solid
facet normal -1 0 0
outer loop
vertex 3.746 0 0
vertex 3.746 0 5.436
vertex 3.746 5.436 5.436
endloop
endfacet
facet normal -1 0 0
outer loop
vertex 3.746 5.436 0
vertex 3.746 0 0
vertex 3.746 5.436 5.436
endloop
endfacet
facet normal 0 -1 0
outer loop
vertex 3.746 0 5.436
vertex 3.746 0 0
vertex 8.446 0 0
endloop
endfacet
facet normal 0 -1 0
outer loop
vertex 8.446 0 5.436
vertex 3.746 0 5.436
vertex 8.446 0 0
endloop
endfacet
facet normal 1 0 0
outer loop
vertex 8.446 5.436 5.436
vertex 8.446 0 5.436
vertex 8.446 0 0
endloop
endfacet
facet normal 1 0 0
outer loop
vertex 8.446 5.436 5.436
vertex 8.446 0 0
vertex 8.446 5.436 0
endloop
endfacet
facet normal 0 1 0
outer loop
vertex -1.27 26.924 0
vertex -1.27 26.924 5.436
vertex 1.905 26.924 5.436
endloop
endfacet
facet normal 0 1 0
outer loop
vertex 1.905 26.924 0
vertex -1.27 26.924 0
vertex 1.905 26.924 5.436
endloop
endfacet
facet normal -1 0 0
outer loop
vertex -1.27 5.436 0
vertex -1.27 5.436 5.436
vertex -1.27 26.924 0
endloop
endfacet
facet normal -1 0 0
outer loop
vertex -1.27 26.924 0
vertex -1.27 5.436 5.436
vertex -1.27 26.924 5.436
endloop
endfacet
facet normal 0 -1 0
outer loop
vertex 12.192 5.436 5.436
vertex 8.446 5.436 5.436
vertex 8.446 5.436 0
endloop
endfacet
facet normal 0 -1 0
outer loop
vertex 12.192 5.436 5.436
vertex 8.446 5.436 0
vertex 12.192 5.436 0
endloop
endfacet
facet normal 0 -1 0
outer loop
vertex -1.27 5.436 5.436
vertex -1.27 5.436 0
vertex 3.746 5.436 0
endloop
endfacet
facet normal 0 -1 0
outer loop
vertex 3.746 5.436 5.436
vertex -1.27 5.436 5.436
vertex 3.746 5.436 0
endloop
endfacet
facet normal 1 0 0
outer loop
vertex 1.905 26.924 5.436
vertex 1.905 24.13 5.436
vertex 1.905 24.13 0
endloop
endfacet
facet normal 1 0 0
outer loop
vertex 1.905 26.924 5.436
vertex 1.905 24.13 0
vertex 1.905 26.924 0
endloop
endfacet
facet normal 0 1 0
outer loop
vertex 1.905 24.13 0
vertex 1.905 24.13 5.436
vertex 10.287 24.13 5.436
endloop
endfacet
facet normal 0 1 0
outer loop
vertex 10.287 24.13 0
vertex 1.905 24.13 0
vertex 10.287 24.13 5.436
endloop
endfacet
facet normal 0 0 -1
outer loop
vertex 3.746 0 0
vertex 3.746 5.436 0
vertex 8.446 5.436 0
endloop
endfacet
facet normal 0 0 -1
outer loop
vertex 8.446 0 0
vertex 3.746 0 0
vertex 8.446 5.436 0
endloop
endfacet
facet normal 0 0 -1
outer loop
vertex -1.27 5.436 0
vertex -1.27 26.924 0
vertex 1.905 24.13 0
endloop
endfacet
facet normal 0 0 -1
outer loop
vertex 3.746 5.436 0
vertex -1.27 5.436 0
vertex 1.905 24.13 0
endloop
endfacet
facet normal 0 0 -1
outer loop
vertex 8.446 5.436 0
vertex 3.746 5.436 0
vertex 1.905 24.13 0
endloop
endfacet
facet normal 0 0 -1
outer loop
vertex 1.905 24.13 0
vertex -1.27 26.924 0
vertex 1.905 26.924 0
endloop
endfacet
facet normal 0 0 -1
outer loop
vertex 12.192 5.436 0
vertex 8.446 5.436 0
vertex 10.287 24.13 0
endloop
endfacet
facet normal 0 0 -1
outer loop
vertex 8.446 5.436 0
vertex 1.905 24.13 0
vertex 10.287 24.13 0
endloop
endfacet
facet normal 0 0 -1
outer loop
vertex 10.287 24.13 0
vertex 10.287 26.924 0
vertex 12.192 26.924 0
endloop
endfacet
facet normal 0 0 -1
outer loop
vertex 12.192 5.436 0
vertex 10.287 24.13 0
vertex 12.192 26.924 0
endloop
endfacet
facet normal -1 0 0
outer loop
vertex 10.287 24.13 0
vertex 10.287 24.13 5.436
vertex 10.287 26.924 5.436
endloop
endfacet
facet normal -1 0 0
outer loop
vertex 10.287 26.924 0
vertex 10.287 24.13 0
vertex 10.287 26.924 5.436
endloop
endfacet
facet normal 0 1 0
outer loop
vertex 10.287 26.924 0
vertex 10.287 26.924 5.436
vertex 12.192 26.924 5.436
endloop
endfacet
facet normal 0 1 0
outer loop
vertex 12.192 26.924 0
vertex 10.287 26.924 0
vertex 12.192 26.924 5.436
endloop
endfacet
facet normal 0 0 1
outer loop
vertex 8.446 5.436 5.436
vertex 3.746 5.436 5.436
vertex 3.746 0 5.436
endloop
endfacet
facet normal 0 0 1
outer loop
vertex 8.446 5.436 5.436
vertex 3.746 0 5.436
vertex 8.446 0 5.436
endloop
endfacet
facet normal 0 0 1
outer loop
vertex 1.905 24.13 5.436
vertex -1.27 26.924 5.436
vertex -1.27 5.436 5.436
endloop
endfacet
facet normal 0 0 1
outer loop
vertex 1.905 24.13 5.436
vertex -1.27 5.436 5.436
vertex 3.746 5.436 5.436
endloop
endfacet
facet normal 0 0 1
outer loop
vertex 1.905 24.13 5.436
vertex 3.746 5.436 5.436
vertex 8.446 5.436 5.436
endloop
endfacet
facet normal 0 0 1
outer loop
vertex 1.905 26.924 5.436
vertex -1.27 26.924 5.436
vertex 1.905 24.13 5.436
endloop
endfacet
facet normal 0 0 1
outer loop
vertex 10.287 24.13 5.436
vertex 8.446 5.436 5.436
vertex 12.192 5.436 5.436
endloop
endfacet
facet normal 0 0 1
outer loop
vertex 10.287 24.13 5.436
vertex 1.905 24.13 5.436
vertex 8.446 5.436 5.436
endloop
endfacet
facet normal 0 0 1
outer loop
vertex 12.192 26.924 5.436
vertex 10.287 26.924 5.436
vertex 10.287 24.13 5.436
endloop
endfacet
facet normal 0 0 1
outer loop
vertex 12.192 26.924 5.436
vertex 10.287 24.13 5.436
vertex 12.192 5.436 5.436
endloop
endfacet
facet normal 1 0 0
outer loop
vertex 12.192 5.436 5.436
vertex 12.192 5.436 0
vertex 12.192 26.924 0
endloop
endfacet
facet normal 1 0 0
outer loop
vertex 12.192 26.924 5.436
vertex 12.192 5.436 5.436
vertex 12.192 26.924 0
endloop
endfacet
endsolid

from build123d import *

# Parameters (mm, degrees)
SKETCH1_W           = 12.192
SKETCH1_H           = 24.384
BOSS_EXTRUDE1_DEPTH = 5.4356
SKETCH2_W           = 3.7465
SKETCH2_H           = 5.4356
CUT_EXTRUDE1_DEPTH  = 5.4356
SKETCH3_W           = 1.905
SKETCH3_H           = 2.794
BOSS_EXTRUDE2_DEPTH = 5.4356
SKETCH4_W           = 1.27
SKETCH4_H           = 21.7424
BOSS_EXTRUDE3_DEPTH = 5.4356
SKETCH5_W           = 3.175
SKETCH5_H           = 0.254
SKETCH5_W_2         = 1.905
SKETCH5_W_3         = 8.382
CUT_EXTRUDE2_DEPTH  = 31.279271711


with BuildPart() as part:
    # Sketch1 → Boss-Extrude1 (new body)
    with BuildSketch(Plane.XY):
        with Locations((6.096, 12.192)):
            Rectangle(SKETCH1_W, SKETCH1_H)
    extrude(amount=BOSS_EXTRUDE1_DEPTH)

    # Sketch2 → Cut-Extrude1 (cut)
    with BuildSketch(Plane.XY.offset(5.4356)):
        with Locations((1.87325, 2.7178)):
            Rectangle(SKETCH2_W, SKETCH2_H)
        with Locations((10.31875, 2.7178)):
            Rectangle(SKETCH2_W, SKETCH2_H)
    extrude(amount=-CUT_EXTRUDE1_DEPTH, mode=Mode.SUBTRACT)

    # Sketch3 → Boss-Extrude2 (add)
    with BuildSketch(Plane.XY.offset(5.4356)):
        with Locations((0.9525, 25.781)):
            Rectangle(SKETCH3_W, SKETCH3_H)
        with Locations((11.2395, 25.781)):
            Rectangle(SKETCH3_W, SKETCH3_H)
    extrude(amount=-BOSS_EXTRUDE2_DEPTH)

    # Sketch4 → Boss-Extrude3 (add)
    with BuildSketch(Plane.XY.offset(5.4356)):
        with Locations((-0.635, 16.3068)):
            Rectangle(SKETCH4_W, SKETCH4_H)
    extrude(amount=-BOSS_EXTRUDE3_DEPTH)

    # Sketch5 → Cut-Extrude2 (cut, through all)
    with BuildSketch(Plane.XY.offset(5.4356)):
        with Locations((0.3175, 27.051)):
            Rectangle(SKETCH5_W, SKETCH5_H)
        with Locations((11.2395, 27.051)):
            Rectangle(SKETCH5_W_2, SKETCH5_H)
        with Locations((6.096, 24.257)):
            Rectangle(SKETCH5_W_3, SKETCH5_H)
    extrude(amount=-CUT_EXTRUDE2_DEPTH, mode=Mode.SUBTRACT)


solid = part.part
